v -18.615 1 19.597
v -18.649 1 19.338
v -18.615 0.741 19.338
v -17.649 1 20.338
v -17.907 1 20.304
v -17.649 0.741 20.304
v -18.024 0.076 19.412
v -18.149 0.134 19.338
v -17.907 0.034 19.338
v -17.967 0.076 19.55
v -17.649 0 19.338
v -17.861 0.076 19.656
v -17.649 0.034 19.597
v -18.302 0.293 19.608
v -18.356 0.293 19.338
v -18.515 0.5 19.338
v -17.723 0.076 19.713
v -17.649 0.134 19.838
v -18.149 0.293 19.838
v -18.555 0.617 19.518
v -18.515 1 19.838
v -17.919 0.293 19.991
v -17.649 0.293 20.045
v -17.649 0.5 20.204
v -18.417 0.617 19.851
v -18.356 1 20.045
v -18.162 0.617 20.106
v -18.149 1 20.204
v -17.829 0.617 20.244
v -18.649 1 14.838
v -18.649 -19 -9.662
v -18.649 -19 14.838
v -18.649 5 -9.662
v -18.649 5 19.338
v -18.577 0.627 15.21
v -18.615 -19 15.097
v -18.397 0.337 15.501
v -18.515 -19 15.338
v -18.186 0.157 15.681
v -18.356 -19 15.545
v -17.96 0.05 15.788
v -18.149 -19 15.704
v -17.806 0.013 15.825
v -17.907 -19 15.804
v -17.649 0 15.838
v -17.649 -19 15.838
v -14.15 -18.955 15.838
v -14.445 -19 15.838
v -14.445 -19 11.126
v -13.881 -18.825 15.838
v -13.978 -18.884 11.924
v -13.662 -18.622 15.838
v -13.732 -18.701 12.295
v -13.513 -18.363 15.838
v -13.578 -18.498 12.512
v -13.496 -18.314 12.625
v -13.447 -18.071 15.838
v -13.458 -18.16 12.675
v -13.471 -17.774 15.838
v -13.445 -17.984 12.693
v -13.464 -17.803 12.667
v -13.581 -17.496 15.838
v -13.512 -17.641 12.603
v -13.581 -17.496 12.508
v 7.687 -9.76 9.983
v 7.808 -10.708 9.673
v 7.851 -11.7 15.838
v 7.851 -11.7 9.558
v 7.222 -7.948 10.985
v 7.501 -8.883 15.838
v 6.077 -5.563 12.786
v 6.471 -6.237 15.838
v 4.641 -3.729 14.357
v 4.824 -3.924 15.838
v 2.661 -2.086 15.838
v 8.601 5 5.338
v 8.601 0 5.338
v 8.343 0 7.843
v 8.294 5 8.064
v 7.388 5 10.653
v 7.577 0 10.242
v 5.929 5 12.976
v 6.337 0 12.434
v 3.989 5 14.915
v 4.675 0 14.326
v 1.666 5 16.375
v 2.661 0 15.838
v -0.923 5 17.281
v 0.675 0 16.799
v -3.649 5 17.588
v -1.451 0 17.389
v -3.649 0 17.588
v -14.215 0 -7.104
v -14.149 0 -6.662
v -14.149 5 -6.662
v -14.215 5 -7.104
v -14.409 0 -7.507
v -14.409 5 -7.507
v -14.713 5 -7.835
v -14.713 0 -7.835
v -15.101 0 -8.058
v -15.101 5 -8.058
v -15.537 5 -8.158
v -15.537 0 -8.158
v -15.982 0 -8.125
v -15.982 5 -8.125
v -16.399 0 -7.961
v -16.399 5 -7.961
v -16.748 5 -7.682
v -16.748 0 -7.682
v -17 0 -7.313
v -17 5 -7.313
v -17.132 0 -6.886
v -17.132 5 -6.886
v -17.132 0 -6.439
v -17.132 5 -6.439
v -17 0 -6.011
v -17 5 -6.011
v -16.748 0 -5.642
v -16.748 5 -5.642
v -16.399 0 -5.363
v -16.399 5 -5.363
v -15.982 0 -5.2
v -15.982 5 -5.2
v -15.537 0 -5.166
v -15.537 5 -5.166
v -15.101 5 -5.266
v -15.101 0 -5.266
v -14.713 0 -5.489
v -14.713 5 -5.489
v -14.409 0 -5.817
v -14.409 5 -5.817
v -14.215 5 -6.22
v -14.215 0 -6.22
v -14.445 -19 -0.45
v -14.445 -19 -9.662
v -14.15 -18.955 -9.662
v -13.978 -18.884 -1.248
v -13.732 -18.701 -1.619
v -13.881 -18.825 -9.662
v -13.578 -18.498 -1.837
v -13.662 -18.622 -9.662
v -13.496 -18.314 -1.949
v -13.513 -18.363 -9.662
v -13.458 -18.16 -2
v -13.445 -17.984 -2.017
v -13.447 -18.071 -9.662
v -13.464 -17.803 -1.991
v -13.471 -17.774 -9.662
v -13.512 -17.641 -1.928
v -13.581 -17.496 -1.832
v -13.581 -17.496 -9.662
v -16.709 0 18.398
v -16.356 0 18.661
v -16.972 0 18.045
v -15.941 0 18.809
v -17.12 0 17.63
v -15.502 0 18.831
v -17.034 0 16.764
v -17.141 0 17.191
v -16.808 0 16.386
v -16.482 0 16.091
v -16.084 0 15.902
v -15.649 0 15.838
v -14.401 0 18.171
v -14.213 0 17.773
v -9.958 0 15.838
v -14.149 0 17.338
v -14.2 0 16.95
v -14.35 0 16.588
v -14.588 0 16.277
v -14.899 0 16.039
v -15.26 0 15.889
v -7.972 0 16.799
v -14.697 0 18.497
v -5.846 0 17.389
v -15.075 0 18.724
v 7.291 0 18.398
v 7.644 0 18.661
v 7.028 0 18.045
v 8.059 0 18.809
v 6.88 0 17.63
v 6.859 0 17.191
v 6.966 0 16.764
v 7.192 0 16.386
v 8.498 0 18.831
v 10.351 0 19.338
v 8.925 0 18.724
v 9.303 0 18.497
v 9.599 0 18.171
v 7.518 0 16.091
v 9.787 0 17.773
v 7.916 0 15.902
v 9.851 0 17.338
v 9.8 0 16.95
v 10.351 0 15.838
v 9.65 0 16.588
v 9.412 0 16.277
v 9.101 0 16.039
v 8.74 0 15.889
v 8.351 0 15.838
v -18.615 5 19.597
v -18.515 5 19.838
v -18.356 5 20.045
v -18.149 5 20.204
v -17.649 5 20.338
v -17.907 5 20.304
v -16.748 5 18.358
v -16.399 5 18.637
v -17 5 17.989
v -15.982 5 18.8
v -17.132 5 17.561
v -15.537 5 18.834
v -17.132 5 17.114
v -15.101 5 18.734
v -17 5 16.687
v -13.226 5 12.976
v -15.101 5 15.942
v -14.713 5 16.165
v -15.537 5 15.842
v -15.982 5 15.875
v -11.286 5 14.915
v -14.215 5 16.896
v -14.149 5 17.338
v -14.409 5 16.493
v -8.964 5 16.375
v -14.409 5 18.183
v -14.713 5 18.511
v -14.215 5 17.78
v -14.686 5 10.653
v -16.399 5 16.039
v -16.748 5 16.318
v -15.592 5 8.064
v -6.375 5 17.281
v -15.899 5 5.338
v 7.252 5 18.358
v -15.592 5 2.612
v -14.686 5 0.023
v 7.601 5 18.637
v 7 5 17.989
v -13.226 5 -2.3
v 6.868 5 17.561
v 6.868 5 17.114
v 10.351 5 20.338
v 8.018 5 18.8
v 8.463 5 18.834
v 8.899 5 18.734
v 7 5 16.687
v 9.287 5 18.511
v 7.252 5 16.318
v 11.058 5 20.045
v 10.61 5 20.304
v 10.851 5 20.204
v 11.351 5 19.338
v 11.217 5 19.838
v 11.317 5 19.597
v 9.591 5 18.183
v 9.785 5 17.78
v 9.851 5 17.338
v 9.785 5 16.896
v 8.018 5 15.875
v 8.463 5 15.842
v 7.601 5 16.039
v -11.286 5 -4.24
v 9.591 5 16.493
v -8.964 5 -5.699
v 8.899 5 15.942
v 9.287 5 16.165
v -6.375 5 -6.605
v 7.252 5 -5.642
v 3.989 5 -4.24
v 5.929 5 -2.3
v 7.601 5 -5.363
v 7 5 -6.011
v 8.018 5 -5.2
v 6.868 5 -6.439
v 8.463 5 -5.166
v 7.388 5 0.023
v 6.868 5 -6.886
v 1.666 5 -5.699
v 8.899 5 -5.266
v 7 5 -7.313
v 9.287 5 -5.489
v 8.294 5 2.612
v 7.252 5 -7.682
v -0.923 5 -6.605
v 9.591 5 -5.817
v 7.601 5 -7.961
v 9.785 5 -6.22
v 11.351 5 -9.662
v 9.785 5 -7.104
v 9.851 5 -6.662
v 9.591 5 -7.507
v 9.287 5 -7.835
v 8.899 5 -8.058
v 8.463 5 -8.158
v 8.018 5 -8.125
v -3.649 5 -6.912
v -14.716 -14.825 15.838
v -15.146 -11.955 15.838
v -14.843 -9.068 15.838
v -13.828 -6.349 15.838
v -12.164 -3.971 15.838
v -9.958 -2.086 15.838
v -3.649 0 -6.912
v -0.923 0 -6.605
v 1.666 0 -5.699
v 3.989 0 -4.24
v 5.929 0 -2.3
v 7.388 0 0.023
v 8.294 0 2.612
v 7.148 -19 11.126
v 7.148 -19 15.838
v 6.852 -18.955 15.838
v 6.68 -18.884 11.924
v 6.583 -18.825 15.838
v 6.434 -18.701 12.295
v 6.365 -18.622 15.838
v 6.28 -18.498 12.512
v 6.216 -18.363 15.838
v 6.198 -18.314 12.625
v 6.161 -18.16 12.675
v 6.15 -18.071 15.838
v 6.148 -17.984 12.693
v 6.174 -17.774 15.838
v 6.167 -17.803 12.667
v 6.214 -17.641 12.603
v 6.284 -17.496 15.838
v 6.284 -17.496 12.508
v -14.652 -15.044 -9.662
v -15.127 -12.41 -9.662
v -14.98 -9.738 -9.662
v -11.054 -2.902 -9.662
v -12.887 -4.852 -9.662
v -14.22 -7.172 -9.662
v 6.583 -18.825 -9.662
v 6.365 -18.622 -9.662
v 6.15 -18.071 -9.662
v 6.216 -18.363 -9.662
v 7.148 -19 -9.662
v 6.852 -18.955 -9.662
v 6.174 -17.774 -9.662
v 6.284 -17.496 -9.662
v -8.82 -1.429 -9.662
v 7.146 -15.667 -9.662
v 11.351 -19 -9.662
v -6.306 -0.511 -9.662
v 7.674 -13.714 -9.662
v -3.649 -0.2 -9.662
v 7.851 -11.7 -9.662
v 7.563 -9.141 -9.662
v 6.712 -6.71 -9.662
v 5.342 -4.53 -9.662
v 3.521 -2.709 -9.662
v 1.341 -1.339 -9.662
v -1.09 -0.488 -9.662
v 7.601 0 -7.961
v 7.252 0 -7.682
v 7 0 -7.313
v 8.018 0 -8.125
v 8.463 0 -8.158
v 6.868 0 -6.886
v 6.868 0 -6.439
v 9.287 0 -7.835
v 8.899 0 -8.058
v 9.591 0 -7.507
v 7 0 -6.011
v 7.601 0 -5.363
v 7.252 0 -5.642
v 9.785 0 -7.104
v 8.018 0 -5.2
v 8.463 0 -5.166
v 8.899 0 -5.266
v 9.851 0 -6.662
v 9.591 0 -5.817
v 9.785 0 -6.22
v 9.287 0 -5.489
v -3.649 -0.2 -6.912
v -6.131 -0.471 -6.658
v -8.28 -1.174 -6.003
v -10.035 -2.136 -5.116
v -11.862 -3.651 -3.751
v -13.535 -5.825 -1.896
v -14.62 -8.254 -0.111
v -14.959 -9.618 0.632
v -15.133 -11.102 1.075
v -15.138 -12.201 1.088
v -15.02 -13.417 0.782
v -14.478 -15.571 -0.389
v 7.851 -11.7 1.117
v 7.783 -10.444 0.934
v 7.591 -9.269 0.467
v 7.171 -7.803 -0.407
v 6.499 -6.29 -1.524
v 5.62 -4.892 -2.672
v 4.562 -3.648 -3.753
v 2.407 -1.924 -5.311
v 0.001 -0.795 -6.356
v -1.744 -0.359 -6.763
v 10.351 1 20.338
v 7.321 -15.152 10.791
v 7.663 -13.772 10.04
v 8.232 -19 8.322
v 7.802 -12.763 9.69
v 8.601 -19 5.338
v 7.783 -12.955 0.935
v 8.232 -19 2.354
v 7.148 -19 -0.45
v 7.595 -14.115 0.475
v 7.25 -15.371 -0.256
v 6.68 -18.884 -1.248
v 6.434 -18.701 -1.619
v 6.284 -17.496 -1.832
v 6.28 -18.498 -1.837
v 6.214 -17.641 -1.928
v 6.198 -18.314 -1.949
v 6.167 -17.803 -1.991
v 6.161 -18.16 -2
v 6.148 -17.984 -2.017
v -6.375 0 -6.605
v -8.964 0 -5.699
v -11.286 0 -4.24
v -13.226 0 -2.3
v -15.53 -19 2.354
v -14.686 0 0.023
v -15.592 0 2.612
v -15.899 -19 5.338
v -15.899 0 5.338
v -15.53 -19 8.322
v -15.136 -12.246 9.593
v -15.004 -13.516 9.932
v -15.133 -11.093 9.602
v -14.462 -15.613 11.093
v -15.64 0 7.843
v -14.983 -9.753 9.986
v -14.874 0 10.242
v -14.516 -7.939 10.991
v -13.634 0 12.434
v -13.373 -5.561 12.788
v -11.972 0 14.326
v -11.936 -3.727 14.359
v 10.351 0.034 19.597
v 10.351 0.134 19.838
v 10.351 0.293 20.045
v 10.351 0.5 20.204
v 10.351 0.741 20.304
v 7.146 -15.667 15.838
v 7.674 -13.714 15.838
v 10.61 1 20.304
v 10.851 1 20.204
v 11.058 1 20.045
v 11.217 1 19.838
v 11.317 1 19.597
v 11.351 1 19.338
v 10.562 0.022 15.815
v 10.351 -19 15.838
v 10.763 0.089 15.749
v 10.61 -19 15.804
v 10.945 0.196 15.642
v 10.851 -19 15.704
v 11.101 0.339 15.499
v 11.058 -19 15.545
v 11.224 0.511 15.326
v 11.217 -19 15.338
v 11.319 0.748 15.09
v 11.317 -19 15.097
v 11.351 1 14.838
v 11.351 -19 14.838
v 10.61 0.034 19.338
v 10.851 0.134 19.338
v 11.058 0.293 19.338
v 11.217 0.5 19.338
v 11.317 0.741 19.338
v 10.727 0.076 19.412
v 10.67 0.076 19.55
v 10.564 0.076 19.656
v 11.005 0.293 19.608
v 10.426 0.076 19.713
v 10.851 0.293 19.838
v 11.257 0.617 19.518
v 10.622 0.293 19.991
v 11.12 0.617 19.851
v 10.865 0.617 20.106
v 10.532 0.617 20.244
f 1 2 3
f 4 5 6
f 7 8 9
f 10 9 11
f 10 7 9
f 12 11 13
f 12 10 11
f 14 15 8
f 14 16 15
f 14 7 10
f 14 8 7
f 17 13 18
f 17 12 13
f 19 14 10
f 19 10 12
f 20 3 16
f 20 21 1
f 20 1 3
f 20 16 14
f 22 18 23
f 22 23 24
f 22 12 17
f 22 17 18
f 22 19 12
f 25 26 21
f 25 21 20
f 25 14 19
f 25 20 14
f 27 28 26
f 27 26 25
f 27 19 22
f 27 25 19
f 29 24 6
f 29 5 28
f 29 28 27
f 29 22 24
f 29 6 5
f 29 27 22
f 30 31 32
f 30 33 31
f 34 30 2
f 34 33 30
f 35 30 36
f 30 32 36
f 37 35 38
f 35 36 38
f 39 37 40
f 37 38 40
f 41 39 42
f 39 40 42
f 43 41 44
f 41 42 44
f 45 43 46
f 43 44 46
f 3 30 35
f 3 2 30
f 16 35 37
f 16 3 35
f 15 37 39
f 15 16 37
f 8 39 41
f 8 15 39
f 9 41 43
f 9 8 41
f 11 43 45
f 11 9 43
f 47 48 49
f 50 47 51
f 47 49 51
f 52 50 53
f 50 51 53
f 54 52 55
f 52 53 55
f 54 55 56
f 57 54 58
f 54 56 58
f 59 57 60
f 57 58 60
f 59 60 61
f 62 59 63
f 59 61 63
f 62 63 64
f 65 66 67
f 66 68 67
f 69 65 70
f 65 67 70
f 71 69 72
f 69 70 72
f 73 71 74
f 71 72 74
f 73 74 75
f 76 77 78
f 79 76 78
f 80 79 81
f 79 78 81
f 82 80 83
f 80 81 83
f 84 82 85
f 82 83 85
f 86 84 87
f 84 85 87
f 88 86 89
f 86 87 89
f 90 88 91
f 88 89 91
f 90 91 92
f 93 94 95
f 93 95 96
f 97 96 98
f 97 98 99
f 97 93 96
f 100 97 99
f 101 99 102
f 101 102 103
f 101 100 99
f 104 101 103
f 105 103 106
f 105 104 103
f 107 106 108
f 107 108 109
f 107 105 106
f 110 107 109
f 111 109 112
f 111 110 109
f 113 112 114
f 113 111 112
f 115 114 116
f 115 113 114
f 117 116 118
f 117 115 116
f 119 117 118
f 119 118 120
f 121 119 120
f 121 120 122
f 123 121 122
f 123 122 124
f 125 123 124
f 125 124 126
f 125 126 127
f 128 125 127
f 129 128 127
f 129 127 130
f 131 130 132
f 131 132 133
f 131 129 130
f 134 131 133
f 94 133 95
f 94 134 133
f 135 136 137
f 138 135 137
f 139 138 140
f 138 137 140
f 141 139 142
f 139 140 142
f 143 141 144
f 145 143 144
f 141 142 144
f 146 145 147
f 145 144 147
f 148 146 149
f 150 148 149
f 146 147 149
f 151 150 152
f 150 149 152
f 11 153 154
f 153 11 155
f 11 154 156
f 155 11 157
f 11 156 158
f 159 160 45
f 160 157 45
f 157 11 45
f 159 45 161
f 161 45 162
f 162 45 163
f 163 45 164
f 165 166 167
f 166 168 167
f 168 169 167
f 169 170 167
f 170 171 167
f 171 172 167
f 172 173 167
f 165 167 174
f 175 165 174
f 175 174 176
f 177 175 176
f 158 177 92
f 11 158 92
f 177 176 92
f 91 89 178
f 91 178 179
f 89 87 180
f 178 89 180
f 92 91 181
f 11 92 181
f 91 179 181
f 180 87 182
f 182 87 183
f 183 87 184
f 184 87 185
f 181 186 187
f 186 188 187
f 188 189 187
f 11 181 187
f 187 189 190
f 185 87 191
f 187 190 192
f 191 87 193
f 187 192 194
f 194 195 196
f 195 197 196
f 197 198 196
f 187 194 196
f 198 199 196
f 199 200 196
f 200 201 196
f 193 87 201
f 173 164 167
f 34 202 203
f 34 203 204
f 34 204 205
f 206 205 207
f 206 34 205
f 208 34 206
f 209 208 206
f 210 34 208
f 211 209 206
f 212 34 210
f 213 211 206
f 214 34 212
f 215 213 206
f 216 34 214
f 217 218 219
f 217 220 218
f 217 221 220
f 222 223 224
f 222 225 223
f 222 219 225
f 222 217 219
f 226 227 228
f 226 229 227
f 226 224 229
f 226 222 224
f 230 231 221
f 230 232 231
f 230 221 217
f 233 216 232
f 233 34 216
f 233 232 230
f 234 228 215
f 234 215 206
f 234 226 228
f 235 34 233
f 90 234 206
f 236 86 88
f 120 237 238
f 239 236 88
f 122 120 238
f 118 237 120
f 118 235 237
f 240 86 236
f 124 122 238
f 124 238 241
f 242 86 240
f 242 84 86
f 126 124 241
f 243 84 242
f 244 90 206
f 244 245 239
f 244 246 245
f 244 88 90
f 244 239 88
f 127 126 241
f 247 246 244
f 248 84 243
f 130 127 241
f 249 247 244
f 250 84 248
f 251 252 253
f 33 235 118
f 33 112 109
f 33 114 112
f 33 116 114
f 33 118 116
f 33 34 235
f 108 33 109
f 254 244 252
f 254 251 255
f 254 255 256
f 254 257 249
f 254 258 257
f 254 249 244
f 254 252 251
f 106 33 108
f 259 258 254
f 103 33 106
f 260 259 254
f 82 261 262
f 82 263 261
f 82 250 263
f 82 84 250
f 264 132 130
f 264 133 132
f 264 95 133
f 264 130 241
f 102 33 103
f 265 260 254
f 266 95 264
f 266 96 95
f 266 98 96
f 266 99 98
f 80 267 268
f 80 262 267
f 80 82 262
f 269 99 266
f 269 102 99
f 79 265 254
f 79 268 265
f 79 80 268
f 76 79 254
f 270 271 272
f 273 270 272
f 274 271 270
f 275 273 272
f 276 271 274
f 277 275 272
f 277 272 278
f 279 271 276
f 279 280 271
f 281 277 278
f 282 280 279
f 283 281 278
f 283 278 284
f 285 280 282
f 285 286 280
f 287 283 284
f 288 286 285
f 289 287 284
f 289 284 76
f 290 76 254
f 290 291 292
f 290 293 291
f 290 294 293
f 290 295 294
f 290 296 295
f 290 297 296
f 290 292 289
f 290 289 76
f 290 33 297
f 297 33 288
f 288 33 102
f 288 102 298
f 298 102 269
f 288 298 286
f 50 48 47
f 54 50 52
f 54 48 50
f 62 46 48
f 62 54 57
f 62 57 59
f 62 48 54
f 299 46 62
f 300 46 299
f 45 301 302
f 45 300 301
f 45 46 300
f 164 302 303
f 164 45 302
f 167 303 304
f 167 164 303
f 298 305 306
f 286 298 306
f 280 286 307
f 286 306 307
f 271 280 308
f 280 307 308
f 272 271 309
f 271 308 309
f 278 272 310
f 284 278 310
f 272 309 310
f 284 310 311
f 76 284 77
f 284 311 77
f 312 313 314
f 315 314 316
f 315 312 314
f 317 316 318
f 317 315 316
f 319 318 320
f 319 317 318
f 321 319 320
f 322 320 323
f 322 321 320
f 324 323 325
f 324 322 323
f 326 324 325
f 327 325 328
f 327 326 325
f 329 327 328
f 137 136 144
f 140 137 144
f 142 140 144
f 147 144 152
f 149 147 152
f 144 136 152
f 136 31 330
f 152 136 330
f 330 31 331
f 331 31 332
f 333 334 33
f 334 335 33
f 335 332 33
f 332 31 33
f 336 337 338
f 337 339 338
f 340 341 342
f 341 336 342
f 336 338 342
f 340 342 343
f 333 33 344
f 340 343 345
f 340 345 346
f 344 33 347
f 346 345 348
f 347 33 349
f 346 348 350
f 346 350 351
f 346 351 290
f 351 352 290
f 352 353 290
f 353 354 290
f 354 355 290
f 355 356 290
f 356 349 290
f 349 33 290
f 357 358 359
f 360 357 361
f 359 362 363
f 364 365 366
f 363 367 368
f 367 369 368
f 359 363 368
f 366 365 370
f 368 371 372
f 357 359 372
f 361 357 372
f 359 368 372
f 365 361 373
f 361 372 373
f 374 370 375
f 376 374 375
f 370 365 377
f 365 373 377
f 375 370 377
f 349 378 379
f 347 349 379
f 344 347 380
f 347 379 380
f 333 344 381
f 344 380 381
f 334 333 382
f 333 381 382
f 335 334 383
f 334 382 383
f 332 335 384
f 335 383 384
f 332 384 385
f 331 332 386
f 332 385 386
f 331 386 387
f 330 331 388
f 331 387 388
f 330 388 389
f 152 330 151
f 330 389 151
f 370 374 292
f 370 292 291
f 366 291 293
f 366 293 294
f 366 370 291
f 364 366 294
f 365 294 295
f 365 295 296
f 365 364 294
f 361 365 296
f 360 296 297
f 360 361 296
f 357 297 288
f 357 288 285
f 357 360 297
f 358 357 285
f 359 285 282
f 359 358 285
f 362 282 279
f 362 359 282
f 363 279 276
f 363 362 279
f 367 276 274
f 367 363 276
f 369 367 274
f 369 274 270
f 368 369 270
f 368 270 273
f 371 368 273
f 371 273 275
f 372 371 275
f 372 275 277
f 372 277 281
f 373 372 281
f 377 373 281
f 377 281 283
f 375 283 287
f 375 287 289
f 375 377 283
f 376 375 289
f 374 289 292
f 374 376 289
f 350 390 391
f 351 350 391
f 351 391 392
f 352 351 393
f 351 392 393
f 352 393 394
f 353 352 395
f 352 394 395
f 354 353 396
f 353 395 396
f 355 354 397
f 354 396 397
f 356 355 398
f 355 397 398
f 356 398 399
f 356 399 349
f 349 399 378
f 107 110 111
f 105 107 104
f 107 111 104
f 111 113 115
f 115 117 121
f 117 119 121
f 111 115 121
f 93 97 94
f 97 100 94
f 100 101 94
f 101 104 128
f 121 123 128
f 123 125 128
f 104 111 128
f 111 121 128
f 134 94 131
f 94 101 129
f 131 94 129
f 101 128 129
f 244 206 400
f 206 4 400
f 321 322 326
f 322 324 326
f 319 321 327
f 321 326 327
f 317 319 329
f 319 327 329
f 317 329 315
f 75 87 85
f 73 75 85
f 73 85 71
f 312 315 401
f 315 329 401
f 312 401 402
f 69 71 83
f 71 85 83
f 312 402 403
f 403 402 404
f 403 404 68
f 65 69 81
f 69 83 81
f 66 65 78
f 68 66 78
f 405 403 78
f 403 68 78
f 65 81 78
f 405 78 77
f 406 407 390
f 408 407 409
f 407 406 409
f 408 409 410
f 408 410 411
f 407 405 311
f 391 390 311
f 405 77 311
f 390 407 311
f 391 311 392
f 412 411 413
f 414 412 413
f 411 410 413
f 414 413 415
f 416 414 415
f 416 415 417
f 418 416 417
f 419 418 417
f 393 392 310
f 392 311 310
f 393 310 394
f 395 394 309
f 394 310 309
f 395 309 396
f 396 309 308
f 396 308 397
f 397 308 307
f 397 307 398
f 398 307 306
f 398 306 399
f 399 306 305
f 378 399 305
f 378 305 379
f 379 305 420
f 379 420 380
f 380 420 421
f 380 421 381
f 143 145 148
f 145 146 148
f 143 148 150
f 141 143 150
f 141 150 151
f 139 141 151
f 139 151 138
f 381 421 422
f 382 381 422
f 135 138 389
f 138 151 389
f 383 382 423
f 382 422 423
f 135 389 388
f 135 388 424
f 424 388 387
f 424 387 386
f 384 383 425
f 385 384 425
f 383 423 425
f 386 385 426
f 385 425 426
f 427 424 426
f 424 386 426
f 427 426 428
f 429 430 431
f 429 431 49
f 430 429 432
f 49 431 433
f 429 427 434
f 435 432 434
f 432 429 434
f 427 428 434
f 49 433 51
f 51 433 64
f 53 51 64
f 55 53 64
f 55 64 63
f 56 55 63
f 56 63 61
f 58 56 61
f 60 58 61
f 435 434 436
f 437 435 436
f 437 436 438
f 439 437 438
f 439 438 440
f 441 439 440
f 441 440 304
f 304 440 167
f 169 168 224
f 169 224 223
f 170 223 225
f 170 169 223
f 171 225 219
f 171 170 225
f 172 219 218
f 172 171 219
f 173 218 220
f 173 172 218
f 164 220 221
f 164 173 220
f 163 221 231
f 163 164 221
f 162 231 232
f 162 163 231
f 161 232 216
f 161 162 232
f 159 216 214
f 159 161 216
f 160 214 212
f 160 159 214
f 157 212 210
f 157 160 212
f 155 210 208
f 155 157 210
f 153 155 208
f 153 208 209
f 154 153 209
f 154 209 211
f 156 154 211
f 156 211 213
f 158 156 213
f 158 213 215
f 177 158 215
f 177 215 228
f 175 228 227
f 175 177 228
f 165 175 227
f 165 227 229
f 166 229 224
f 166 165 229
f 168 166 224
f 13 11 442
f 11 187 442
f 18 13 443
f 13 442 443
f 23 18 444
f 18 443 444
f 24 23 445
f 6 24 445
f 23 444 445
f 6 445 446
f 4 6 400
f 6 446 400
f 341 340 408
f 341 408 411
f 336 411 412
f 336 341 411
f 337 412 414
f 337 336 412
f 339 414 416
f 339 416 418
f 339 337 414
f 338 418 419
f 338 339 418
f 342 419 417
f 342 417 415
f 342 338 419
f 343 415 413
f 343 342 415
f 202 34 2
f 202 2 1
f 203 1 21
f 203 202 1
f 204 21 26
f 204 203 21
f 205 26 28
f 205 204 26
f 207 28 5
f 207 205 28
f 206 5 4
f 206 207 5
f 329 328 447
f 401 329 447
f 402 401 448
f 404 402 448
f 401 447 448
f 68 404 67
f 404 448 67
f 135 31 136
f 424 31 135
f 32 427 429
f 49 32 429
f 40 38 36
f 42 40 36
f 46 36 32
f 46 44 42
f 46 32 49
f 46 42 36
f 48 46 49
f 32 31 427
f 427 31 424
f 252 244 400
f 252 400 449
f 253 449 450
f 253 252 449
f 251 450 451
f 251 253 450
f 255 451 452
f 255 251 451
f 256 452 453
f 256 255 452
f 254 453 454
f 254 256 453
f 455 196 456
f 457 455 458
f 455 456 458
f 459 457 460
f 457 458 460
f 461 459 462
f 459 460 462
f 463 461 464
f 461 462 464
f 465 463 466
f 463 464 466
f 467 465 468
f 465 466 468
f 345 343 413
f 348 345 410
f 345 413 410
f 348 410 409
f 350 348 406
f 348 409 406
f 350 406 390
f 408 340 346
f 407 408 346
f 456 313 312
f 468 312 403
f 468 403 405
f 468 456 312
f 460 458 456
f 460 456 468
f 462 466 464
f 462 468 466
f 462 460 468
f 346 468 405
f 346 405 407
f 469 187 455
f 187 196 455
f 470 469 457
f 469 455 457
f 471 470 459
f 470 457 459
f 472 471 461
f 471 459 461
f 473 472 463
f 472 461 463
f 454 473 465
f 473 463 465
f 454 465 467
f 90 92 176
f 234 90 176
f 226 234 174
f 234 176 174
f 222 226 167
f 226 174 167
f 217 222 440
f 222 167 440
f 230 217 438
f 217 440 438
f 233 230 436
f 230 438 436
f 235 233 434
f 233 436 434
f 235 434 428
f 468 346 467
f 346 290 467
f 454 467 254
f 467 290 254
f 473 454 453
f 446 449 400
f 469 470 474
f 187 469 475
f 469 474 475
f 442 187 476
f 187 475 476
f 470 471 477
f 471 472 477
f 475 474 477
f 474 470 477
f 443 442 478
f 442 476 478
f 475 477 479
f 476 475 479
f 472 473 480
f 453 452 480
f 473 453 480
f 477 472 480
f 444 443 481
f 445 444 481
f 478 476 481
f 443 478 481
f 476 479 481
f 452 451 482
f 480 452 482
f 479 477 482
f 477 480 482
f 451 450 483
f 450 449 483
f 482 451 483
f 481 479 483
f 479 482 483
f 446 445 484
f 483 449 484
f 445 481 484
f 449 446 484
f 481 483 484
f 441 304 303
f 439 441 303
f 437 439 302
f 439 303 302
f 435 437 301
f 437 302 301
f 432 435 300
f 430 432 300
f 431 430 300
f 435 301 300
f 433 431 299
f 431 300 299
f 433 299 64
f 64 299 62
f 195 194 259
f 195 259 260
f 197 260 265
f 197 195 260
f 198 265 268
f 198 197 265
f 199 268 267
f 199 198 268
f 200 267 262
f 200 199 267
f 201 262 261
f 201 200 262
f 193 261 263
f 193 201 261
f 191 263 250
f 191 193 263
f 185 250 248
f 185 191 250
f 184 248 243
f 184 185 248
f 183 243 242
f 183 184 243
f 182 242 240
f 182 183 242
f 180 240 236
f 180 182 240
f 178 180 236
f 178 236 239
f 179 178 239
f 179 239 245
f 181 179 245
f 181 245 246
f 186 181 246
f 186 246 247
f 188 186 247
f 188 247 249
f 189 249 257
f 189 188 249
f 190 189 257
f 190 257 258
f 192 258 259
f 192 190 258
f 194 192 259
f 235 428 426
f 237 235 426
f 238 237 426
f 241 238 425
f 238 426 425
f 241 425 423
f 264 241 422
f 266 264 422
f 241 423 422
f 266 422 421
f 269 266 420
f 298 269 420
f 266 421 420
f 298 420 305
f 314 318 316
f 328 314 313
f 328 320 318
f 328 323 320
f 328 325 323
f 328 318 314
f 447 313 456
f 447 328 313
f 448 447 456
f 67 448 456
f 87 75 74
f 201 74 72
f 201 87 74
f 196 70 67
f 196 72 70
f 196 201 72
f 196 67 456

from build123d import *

# Parameters (mm, degrees)
SKETCH1_R           = 1.5
BOSS_EXTRUDE1_DEPTH = 5
SKETCH3_W           = 30
SKETCH3_H           = 25.5
BOSS_EXTRUDE2_DEPTH = 19
CUT_EXTRUDE7_DEPTH  = 26.5
FILLET10_R          = 1
FILLET11_R          = 1
CUT_EXTRUDE9_DEPTH  = 20


with BuildPart() as part:
    # Sketch1 → Boss-Extrude1 (new body)
    with BuildSketch(Plane(origin=(0, 0, 0), x_dir=(1, 0, 0), z_dir=(0, 1, 0))):
        with BuildLine():
            Line((-15.898648649, -5.337837838), (-18.648648649, -5.337837838))
            Line((-18.648648649, -5.337837838), (-18.648648649, -20.337837838))
            Line((-18.648648649, -20.337837838), (-3.648648649, -20.337837838))
            Line((-3.648648649, -20.337837838), (-3.648648649, -17.587837838))
            ThreePointArc((-3.648648649, -17.587837838), (-12.310706718, -13.999895907), (-15.898648649, -5.337837838))
        make_face()
        with Locations((-15.648648649, -17.337837838)):
            Circle(SKETCH1_R, mode=Mode.SUBTRACT)
        with BuildLine():
            ThreePointArc((8.601351351, -5.337837838), (5.013409421, -13.999895907), (-3.648648649, -17.587837838))
            Line((-3.648648649, -17.587837838), (-3.648648649, -20.337837838))
            Line((-3.648648649, -20.337837838), (11.351351351, -20.337837838))
            Line((11.351351351, -20.337837838), (11.351351351, -5.337837838))
            Line((11.351351351, -5.337837838), (8.601351351, -5.337837838))
        make_face()
        with Locations((8.351351351, -17.337837838)):
            Circle(SKETCH1_R, mode=Mode.SUBTRACT)
        with BuildLine():
            Line((-3.648648649, 9.662162162), (-3.648648649, 6.912162162))
            ThreePointArc((-3.648648649, 6.912162162), (5.013409421, 3.324220232), (8.601351351, -5.337837838))
            Line((8.601351351, -5.337837838), (11.351351351, -5.337837838))
            Line((11.351351351, -5.337837838), (11.351351351, 9.662162162))
            Line((11.351351351, 9.662162162), (-3.648648649, 9.662162162))
        make_face()
        with Locations((8.351351351, 6.662162162)):
            Circle(SKETCH1_R, mode=Mode.SUBTRACT)
        with BuildLine():
            Line((-18.648648649, 9.662162162), (-18.648648649, -5.337837838))
            Line((-18.648648649, -5.337837838), (-15.898648649, -5.337837838))
            ThreePointArc((-15.898648649, -5.337837838), (-12.310706718, 3.324220232), (-3.648648649, 6.912162162))
            Line((-3.648648649, 6.912162162), (-3.648648649, 9.662162162))
            Line((-3.648648649, 9.662162162), (-18.648648649, 9.662162162))
        make_face()
        with Locations((-15.648648649, 6.662162162)):
            Circle(SKETCH1_R, mode=Mode.SUBTRACT)
    extrude(amount=BOSS_EXTRUDE1_DEPTH)

    # Sketch3 → Boss-Extrude2 (add)
    with BuildSketch(Plane.XZ):
        with Locations((-3.648648649, 3.087837838)):
            Rectangle(SKETCH3_W, SKETCH3_H)
    extrude(amount=BOSS_EXTRUDE2_DEPTH)

    # Sketch4 → Cut-Extrude7 (cut, through all)
    with BuildSketch(Plane.XY.offset(15.837837838)):
        with BuildLine():
            ThreePointArc((7.851351351, -11.7), (4.483079335, -3.568272016), (-3.648648649, -0.2))
            Line((-3.648648649, -0.2), (-3.648648649, -19))
            Line((-3.648648649, -19), (5.237295308, -19))
            ThreePointArc((5.237295308, -19), (7.178131932, -15.57696044), (7.851351351, -11.7))
        make_face()
        with BuildLine():
            Line((-3.648648649, -19), (-3.648648649, -0.2))
            ThreePointArc((-3.648648649, -0.2), (-14.045763633, -6.78573505), (-12.534592605, -19))
            Line((-12.534592605, -19), (-3.648648649, -19))
        make_face()
        with BuildLine():
            Line((5.237295308, -19), (-3.648648649, -19))
            Line((-3.648648649, -19), (-3.648648649, -23.2))
            ThreePointArc((-3.648648649, -23.2), (1.265616301, -22.097114984), (5.237295308, -19))
        make_face()
        with BuildLine():
            Line((-3.648648649, -23.2), (-3.648648649, -19))
            Line((-3.648648649, -19), (-12.534592605, -19))
            ThreePointArc((-12.534592605, -19), (-8.562913599, -22.097114984), (-3.648648649, -23.2))
        make_face()
    extrude(amount=-CUT_EXTRUDE7_DEPTH, mode=Mode.SUBTRACT)

    # Fillet10
    fillet10_edges = [part.edges().sort_by_distance(p)[0] for p in [
        (11.351351351, 2.5, 20.337837838),
        (-18.648648649, 2.5, 20.337837838),
        (-18.648648649, 0, 18.087837838),
        (-18.648648649, -9.5, 15.837837838),
        (11.351351351, -9.5, 15.837837838),
        (11.351351351, 0, 18.087837838),
        (-3.648648649, 0, 20.337837838),
    ]]
    fillet(fillet10_edges, radius=FILLET10_R)

    # Fillet11
    fillet11_edges = [part.edges().sort_by_distance(p)[0] for p in [
        (5.237295308, -19, 3.087837838),
        (-12.534592605, -19, 3.087837838),
    ]]
    fillet(fillet11_edges, radius=FILLET11_R)

    # Sketch5 → Cut-Extrude9 (cut, through all)
    with BuildSketch(Plane(origin=(0, 0, 0), x_dir=(1, 0, 0), z_dir=(0, 1, 0))):
        with BuildLine():
            ThreePointArc((2.661066083, -15.837837838), (-3.648648649, 6.912162162), (-9.958363381, -15.837837838))
            Line((-9.958363381, -15.837837838), (2.661066083, -15.837837838))
        make_face()
    extrude(amount=-CUT_EXTRUDE9_DEPTH, mode=Mode.SUBTRACT)


solid = part.part
